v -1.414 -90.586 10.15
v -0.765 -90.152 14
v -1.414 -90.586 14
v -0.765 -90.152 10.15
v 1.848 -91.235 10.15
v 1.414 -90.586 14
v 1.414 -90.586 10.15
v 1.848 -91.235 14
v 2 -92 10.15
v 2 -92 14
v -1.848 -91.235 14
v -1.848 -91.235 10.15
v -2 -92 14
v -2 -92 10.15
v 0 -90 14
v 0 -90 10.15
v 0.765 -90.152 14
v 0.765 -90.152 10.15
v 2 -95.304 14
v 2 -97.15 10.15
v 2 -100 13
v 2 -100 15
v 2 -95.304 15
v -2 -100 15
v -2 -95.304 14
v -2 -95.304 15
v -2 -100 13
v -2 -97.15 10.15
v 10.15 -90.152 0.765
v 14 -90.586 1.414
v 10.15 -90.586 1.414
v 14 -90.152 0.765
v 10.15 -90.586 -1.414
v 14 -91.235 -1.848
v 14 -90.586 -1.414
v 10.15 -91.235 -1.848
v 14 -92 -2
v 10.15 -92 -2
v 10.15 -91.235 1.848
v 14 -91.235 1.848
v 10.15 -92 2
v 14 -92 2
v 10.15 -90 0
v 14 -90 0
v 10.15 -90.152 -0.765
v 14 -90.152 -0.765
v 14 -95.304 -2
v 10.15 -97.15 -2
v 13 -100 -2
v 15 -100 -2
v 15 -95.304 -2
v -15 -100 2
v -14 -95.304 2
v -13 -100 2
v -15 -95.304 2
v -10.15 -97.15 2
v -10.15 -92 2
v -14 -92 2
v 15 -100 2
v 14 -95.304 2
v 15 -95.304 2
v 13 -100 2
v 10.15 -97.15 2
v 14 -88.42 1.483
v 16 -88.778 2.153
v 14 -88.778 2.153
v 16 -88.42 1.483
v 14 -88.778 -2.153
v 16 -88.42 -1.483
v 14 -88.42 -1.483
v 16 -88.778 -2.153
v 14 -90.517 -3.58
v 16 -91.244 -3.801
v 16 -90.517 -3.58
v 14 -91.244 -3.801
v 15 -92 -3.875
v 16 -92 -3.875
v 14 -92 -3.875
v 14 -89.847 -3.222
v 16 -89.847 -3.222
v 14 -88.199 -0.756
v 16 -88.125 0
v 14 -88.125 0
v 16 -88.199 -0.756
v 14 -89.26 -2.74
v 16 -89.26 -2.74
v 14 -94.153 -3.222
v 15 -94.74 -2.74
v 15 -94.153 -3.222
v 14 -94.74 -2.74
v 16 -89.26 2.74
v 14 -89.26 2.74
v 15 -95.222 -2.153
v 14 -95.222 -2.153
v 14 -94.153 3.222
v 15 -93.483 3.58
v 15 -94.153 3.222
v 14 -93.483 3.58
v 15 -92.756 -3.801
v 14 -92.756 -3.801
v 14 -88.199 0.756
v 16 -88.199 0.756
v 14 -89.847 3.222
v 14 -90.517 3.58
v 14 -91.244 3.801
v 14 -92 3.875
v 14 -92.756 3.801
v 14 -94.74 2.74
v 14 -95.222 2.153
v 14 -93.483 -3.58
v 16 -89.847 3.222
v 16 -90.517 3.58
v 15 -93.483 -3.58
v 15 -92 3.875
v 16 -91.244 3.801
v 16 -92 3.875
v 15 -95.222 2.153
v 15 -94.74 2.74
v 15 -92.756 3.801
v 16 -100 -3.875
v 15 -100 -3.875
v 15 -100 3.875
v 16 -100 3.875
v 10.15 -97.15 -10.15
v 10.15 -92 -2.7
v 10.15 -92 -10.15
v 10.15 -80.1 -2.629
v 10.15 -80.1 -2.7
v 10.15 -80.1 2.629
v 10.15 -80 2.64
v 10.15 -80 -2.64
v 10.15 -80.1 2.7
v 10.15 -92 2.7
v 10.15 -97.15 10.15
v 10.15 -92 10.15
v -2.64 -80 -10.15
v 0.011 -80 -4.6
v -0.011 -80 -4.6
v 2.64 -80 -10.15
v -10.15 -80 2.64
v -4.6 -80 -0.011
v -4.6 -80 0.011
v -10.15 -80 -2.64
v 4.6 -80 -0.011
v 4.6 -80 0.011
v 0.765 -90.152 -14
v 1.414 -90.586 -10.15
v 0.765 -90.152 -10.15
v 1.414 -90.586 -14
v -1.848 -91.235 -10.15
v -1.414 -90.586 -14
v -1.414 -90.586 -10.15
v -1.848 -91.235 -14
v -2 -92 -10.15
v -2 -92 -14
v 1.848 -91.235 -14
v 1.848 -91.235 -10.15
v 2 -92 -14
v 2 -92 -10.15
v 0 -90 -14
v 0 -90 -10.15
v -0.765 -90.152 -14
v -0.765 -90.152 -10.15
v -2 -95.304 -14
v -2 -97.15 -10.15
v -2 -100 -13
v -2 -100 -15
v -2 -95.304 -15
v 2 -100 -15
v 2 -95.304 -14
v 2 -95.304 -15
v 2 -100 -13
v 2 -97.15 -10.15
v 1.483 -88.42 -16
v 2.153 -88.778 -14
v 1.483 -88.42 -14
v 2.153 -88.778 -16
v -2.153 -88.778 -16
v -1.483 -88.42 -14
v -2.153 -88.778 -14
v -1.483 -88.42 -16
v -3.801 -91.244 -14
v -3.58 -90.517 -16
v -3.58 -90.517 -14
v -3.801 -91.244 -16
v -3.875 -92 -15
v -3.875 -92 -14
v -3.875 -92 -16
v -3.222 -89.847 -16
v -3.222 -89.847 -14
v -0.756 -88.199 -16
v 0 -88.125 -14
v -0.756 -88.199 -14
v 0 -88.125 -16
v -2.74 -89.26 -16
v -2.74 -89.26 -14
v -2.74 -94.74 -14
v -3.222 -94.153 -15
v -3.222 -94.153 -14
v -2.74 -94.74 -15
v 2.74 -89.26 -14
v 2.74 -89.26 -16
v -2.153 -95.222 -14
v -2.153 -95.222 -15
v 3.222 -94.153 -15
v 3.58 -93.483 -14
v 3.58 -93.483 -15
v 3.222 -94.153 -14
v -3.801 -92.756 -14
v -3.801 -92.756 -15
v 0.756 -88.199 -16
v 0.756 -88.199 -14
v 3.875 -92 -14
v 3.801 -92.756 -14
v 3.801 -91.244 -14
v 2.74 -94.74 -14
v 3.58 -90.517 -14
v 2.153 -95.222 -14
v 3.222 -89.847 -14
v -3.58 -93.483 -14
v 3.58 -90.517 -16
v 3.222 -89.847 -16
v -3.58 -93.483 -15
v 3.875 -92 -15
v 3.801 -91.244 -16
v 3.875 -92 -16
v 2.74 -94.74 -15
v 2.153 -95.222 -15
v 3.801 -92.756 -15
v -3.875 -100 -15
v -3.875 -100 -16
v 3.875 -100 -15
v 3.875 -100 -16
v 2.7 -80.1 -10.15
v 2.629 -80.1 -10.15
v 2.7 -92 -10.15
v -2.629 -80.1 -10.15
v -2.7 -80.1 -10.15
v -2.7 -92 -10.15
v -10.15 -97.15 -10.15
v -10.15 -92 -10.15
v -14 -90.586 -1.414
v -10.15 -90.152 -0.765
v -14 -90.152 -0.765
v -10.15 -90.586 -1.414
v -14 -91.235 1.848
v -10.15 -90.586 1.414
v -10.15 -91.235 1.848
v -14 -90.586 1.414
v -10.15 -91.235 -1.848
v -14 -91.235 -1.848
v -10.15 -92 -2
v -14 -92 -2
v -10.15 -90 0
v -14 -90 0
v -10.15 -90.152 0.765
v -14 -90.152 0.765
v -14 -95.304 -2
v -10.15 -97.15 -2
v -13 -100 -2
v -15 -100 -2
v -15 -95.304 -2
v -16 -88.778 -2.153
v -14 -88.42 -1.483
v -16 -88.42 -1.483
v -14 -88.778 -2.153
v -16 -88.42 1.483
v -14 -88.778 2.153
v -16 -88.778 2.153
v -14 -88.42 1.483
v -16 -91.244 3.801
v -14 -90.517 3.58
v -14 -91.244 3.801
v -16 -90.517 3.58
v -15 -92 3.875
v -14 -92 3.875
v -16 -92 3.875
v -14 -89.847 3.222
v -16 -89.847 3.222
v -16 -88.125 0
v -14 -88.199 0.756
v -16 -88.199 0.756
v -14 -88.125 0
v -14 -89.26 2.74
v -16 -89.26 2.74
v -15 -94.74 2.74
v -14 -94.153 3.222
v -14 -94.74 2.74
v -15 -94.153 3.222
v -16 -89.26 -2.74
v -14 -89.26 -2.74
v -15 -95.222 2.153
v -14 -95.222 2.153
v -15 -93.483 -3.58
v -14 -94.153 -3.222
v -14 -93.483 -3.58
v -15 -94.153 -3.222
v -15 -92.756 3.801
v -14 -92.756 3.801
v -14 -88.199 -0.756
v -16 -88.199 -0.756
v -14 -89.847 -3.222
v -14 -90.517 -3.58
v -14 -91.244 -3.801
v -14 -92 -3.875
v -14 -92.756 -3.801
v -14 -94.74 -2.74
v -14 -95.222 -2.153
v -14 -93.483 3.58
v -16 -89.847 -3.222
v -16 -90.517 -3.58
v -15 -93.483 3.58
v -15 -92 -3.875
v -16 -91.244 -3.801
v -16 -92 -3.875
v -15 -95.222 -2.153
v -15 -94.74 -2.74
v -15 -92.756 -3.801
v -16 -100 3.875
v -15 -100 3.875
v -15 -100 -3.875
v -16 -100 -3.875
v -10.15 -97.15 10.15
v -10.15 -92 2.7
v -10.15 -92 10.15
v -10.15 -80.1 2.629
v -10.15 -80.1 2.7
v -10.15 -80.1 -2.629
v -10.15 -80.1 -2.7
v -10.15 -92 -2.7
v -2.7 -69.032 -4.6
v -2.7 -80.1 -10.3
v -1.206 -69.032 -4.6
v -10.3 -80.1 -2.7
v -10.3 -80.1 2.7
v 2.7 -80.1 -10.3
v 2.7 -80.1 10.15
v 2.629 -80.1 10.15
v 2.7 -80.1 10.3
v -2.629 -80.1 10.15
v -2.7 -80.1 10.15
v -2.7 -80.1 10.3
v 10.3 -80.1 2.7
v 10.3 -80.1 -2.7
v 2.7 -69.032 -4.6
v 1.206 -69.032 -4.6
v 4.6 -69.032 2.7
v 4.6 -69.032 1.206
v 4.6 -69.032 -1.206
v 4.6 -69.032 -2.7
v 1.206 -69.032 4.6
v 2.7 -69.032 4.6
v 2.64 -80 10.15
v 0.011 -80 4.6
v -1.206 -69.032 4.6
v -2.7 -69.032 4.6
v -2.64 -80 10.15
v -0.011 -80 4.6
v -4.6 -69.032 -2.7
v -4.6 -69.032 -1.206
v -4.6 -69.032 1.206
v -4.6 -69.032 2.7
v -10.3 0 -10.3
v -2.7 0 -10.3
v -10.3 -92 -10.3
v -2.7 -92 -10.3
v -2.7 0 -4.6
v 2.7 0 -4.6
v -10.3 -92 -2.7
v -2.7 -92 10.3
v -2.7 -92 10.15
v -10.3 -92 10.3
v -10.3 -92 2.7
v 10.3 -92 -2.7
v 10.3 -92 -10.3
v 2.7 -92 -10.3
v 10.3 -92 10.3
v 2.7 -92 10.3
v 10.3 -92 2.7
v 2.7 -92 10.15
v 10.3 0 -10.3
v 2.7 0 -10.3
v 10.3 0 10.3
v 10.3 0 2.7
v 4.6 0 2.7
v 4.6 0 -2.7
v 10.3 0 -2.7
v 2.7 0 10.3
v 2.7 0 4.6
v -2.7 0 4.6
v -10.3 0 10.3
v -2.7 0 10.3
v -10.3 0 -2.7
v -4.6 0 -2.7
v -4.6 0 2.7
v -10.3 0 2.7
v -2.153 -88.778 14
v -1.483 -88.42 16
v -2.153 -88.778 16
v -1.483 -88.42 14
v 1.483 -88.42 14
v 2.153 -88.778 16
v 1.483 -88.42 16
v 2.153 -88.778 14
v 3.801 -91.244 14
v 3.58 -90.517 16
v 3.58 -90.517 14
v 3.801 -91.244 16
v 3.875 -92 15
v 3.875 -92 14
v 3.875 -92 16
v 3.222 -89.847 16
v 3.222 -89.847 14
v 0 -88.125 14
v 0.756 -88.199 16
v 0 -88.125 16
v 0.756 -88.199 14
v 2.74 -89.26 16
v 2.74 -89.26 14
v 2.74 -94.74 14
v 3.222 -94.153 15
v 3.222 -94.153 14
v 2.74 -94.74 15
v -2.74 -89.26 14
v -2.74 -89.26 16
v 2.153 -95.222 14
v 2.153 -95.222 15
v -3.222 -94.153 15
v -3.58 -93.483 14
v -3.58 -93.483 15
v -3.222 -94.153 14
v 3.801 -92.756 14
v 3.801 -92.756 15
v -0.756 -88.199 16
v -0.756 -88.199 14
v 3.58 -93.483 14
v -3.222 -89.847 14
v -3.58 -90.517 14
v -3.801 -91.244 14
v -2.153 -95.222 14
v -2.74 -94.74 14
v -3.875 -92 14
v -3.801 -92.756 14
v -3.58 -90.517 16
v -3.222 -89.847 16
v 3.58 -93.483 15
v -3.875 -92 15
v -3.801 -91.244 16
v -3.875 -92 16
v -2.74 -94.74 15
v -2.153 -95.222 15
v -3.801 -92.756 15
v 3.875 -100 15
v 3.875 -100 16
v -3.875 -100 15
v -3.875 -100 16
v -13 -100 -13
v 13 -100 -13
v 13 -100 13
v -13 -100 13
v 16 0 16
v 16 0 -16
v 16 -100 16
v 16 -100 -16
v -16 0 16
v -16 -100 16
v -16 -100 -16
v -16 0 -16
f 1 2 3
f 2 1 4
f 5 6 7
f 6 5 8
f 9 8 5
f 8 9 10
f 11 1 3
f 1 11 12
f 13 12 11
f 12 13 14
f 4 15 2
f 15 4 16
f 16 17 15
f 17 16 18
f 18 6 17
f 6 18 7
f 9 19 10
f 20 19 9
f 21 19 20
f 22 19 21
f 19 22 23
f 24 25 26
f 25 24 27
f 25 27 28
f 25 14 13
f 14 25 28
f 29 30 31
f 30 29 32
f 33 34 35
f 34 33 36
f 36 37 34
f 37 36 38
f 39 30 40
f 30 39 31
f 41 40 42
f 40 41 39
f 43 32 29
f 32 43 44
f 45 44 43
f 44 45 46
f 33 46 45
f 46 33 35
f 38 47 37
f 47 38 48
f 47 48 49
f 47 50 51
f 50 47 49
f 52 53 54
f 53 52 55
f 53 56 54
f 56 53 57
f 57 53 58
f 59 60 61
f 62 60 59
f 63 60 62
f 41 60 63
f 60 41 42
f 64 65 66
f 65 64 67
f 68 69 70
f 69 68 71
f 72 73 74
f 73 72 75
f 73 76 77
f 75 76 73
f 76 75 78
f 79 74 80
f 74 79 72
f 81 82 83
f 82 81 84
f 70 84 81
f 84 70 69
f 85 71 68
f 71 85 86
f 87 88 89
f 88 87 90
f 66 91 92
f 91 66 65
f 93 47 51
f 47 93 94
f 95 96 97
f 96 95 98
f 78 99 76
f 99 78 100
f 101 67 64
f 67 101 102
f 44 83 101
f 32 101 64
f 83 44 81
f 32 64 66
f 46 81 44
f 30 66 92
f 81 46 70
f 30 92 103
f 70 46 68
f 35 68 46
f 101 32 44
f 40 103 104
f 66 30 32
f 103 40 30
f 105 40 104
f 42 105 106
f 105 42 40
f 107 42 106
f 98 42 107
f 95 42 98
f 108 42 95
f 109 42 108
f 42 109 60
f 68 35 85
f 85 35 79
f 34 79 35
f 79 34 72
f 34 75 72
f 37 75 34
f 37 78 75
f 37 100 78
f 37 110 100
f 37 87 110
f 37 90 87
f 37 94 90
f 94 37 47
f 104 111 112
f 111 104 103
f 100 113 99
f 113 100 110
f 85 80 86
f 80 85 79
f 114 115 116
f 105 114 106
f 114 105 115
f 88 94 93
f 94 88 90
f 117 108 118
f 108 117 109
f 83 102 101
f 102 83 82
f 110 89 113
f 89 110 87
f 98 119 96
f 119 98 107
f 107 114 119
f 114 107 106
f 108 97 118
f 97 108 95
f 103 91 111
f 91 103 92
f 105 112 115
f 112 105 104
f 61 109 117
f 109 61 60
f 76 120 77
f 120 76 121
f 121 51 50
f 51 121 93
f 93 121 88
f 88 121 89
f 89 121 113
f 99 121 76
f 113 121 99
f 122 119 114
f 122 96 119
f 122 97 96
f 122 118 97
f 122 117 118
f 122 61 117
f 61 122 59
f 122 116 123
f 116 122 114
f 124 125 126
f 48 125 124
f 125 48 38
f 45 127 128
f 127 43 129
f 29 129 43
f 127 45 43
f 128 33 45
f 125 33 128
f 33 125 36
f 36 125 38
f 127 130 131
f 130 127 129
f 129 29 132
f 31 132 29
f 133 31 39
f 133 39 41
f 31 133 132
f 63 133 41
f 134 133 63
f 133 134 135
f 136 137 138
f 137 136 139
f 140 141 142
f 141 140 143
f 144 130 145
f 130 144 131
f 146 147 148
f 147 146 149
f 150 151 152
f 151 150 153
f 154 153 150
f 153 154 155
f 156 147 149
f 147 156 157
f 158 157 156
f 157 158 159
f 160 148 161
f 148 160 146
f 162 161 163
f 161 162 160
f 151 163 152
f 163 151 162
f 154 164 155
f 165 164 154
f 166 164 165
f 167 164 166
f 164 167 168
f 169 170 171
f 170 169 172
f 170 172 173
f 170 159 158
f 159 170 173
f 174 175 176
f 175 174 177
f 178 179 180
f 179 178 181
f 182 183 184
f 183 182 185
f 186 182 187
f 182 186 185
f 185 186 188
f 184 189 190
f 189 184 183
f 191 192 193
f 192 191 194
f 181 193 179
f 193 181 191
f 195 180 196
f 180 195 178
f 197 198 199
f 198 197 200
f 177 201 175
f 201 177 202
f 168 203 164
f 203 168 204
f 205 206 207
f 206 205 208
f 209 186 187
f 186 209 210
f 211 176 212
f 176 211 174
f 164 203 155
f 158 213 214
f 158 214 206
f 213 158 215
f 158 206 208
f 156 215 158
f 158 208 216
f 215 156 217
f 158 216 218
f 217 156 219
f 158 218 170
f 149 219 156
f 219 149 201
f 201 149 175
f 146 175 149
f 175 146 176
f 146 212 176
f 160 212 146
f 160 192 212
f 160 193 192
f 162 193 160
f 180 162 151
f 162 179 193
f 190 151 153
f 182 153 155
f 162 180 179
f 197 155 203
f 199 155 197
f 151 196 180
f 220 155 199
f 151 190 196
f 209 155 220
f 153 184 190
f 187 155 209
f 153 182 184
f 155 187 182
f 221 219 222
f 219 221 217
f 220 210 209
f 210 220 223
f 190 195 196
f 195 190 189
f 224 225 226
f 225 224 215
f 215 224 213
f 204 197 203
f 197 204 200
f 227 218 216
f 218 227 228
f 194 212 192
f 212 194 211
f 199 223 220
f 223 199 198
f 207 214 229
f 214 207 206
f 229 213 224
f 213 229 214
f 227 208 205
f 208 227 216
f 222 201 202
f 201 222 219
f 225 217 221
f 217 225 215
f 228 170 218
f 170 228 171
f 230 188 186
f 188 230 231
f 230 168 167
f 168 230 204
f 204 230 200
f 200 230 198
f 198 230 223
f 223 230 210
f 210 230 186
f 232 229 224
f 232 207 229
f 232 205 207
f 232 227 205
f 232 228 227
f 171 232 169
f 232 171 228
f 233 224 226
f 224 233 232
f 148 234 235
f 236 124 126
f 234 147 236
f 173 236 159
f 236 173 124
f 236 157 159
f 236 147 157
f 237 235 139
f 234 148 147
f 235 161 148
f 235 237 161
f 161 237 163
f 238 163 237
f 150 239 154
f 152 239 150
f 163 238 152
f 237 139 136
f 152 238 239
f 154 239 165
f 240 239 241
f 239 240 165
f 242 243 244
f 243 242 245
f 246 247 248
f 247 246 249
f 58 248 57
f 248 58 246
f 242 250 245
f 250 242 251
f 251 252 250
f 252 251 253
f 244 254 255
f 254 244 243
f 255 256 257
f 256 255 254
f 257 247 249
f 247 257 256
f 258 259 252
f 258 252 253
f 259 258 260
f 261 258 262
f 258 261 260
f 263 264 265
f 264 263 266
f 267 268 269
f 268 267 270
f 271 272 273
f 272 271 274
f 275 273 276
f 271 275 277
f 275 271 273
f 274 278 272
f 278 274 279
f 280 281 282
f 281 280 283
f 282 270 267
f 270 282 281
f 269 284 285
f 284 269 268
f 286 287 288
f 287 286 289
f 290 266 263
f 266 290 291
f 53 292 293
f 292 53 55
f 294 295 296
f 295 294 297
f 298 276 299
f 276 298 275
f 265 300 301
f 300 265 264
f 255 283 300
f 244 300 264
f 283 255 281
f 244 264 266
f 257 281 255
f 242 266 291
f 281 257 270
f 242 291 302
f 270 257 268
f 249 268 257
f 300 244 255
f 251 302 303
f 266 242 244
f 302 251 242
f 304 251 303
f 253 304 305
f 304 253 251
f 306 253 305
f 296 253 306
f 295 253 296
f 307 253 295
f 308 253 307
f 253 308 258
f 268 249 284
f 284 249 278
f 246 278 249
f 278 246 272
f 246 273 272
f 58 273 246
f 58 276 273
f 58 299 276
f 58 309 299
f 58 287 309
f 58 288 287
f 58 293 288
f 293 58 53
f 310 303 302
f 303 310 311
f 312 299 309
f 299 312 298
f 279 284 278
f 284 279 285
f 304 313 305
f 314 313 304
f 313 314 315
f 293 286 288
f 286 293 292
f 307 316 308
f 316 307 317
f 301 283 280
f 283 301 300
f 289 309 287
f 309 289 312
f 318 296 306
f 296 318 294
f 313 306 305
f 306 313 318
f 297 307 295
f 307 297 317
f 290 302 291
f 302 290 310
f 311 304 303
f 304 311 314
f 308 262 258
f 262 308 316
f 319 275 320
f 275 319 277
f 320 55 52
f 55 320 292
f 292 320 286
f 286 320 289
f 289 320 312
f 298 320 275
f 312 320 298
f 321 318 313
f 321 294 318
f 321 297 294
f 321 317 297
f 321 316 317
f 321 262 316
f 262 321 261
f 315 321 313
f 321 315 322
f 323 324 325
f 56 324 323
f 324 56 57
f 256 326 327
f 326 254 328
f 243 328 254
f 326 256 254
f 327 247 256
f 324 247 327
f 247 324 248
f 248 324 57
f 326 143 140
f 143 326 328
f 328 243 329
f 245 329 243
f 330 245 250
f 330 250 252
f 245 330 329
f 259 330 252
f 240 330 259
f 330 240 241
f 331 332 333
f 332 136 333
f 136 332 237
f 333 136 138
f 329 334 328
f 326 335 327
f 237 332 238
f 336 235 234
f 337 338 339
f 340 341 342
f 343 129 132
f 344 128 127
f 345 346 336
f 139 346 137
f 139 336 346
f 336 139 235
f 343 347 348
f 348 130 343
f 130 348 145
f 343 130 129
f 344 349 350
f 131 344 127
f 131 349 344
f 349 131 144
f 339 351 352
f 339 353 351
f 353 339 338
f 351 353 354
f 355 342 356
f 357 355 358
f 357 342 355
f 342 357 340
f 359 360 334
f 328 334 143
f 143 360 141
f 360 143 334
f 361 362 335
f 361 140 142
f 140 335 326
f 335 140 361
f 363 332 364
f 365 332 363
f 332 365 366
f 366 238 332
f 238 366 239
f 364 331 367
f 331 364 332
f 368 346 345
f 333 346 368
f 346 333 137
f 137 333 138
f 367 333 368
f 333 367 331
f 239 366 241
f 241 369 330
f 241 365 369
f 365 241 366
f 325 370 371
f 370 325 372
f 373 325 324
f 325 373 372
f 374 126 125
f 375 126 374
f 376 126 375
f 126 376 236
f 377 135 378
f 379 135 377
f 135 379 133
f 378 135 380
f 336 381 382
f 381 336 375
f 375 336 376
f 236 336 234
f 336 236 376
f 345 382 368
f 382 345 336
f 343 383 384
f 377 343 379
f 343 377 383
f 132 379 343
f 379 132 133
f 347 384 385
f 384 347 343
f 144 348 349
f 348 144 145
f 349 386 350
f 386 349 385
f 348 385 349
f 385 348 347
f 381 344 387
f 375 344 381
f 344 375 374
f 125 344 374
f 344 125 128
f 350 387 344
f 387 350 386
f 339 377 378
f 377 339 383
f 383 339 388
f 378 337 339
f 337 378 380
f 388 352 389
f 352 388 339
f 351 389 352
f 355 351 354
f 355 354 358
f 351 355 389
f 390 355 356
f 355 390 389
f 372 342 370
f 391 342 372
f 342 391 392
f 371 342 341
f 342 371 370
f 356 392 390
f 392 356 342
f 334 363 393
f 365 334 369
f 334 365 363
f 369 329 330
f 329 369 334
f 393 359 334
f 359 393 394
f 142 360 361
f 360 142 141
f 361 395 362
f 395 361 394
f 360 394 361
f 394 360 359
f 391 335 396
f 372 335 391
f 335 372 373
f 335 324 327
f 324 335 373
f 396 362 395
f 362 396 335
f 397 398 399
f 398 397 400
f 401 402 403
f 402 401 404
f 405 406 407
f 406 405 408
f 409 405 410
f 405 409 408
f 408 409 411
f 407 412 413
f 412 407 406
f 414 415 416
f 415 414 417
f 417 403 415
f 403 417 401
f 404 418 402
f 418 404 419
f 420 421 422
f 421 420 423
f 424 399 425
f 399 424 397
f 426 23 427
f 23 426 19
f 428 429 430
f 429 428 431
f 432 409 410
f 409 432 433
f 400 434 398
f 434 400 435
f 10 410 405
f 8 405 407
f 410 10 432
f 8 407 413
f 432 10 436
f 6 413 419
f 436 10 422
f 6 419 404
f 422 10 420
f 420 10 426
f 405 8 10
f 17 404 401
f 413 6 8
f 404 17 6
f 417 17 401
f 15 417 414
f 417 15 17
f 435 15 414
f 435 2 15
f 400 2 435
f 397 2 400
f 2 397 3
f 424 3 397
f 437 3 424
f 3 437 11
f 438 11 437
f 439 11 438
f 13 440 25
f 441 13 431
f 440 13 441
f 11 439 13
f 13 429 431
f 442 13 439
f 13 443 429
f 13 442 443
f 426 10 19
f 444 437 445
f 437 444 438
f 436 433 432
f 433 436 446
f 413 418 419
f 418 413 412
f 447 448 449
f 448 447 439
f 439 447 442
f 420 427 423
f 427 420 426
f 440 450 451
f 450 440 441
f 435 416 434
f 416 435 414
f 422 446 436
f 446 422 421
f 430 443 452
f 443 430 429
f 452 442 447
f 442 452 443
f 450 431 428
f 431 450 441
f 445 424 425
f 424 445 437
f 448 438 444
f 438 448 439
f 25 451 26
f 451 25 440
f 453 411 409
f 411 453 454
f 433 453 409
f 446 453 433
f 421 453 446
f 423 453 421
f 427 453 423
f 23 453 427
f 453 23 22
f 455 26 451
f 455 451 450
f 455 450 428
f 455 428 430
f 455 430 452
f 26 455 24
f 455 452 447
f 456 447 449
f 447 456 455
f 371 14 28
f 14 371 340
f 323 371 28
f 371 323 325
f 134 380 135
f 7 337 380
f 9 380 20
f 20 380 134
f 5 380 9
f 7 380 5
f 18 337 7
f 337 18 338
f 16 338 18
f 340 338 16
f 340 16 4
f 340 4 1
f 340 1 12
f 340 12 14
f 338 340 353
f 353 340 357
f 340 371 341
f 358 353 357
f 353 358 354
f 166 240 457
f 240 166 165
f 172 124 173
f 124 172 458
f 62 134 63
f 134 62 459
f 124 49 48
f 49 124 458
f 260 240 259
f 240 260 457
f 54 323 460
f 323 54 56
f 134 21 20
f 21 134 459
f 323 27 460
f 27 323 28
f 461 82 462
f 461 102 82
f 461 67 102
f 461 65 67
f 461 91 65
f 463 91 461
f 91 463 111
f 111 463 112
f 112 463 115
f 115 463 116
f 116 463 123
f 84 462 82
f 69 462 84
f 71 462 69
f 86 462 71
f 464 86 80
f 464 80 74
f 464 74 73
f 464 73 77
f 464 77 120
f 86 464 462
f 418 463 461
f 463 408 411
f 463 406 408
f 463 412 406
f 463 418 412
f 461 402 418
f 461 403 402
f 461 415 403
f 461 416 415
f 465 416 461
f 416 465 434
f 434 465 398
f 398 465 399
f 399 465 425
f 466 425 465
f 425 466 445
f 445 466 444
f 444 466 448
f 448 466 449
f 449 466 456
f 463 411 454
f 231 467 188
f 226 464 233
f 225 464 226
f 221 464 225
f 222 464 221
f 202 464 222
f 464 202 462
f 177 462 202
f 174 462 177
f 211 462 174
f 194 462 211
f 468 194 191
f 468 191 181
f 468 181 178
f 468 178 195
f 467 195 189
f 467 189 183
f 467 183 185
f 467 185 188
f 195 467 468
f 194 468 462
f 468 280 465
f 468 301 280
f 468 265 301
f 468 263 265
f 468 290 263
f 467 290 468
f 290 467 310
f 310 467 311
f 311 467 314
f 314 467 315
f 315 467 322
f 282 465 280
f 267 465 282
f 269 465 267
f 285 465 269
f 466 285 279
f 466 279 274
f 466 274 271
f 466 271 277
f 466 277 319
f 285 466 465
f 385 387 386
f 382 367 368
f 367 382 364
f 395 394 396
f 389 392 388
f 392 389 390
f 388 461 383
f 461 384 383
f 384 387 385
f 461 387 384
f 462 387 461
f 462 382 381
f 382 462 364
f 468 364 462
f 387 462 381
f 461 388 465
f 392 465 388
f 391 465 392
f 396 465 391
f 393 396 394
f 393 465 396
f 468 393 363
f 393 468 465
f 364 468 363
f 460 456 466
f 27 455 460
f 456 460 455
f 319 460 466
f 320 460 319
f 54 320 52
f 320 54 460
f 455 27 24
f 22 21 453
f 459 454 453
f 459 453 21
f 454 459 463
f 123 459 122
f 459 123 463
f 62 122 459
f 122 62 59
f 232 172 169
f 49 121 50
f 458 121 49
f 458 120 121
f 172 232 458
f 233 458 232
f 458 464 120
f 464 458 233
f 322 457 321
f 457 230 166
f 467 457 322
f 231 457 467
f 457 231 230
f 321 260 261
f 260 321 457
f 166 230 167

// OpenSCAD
// Generated by SolidPython 1.1.3 on 2023-12-29 22:18:56


translate(v = [0, -100.0, 0]) {
	difference() {
		translate(v = [0, 50.0, 0]) {
			cube(center = true, size = [32.0000000000, 100.0, 32.0000000000]);
		}
		translate(v = [0, 8, 0]) {
			union() {
				translate(v = [0, 0, 14]) {
					cylinder($fn = 32, h = 4, r = 3.8750000000);
				}
				translate(v = [-3.8750000000, -12, 15]) {
					cube(size = [7.7500000000, 12, 4]);
				}
				union() {
					cylinder($fn = 16, h = 19, r = 2.0000000000);
					translate(v = [-2.0000000000, -12, 0]) {
						cube(size = [4, 12, 19]);
					}
				}
				rotate(a = -90, v = [0, 1, 0]) {
					polyhedron(convexity = 10, faces = [[0, 1, 3], [1, 4, 3], [1, 2, 4], [2, 5, 4], [2, 0, 5], [0, 3, 5], [2, 1, 0], [3, 4, 5]], points = [[0.0000000000, -10.0000000000, 0.0000000000], [10.1500000000, -10.0000000000, 10.1500000000], [10.1500000000, -10.0000000000, -10.1500000000], [0.0000000000, 12.0000000000, 0.0000000000], [10.1500000000, 12.0000000000, 10.1500000000], [10.1500000000, 12.0000000000, -10.1500000000]]);
				}
				rotate(a = 90, v = [0, 1, 0]) {
					union() {
						translate(v = [0, 0, 14]) {
							cylinder($fn = 32, h = 4, r = 3.8750000000);
						}
						translate(v = [-3.8750000000, -12, 15]) {
							cube(size = [7.7500000000, 12, 4]);
						}
						union() {
							cylinder($fn = 16, h = 19, r = 2.0000000000);
							translate(v = [-2.0000000000, -12, 0]) {
								cube(size = [4, 12, 19]);
							}
						}
						rotate(a = -90, v = [0, 1, 0]) {
							polyhedron(convexity = 10, faces = [[0, 1, 3], [1, 4, 3], [1, 2, 4], [2, 5, 4], [2, 0, 5], [0, 3, 5], [2, 1, 0], [3, 4, 5]], points = [[0.0000000000, -10.0000000000, 0.0000000000], [10.1500000000, -10.0000000000, 10.1500000000], [10.1500000000, -10.0000000000, -10.1500000000], [0.0000000000, 12.0000000000, 0.0000000000], [10.1500000000, 12.0000000000, 10.1500000000], [10.1500000000, 12.0000000000, -10.1500000000]]);
						}
					}
				}
				rotate(a = 180, v = [0, 1, 0]) {
					union() {
						translate(v = [0, 0, 14]) {
							cylinder($fn = 32, h = 4, r = 3.8750000000);
						}
						translate(v = [-3.8750000000, -12, 15]) {
							cube(size = [7.7500000000, 12, 4]);
						}
						union() {
							cylinder($fn = 16, h = 19, r = 2.0000000000);
							translate(v = [-2.0000000000, -12, 0]) {
								cube(size = [4, 12, 19]);
							}
						}
						rotate(a = -90, v = [0, 1, 0]) {
							polyhedron(convexity = 10, faces = [[0, 1, 3], [1, 4, 3], [1, 2, 4], [2, 5, 4], [2, 0, 5], [0, 3, 5], [2, 1, 0], [3, 4, 5]], points = [[0.0000000000, -10.0000000000, 0.0000000000], [10.1500000000, -10.0000000000, 10.1500000000], [10.1500000000, -10.0000000000, -10.1500000000], [0.0000000000, 12.0000000000, 0.0000000000], [10.1500000000, 12.0000000000, 10.1500000000], [10.1500000000, 12.0000000000, -10.1500000000]]);
						}
					}
				}
				rotate(a = 270, v = [0, 1, 0]) {
					union() {
						translate(v = [0, 0, 14]) {
							cylinder($fn = 32, h = 4, r = 3.8750000000);
						}
						translate(v = [-3.8750000000, -12, 15]) {
							cube(size = [7.7500000000, 12, 4]);
						}
						union() {
							cylinder($fn = 16, h = 19, r = 2.0000000000);
							translate(v = [-2.0000000000, -12, 0]) {
								cube(size = [4, 12, 19]);
							}
						}
						rotate(a = -90, v = [0, 1, 0]) {
							polyhedron(convexity = 10, faces = [[0, 1, 3], [1, 4, 3], [1, 2, 4], [2, 5, 4], [2, 0, 5], [0, 3, 5], [2, 1, 0], [3, 4, 5]], points = [[0.0000000000, -10.0000000000, 0.0000000000], [10.1500000000, -10.0000000000, 10.1500000000], [10.1500000000, -10.0000000000, -10.1500000000], [0.0000000000, 12.0000000000, 0.0000000000], [10.1500000000, 12.0000000000, 10.1500000000], [10.1500000000, 12.0000000000, -10.1500000000]]);
						}
					}
				}
				translate(v = [0, -10, 0]) {
					rotate(a = -90, v = [1, 0, 0]) {
						polyhedron(convexity = 10, faces = [[0, 1, 4], [1, 5, 4], [1, 2, 5], [2, 6, 5], [2, 3, 6], [3, 7, 6], [3, 0, 7], [0, 4, 7], [3, 2, 1, 0], [4, 5, 6, 7]], points = [[-15.0000000000, 15.0000000000, 0.0000000000], [15.0000000000, 15.0000000000, 0.0000000000], [15.0000000000, -15.0000000000, 0.0000000000], [-15.0000000000, -15.0000000000, 0.0000000000], [0.0000000000, 0.0000000000, 15.0000000000], [0.0000000000, 0.0000000000, 15.0000000000], [0.0000000000, 0.0000000000, 15.0000000000], [0.0000000000, 0.0000000000, 15.0000000000]]);
					}
				}
				translate(v = [0, 11.9000000000, 0]) {
					rotate(a = -90, v = [1, 0, 0]) {
						union() {
							polyhedron(convexity = 10, faces = [[0, 1, 4], [1, 5, 4], [1, 2, 5], [2, 6, 5], [2, 3, 6], [3, 7, 6], [3, 0, 7], [0, 4, 7], [3, 2, 1, 0], [4, 5, 6, 7]], points = [[-10.3000000000, 10.3000000000, 0.0000000000], [-10.3000000000, 2.7000000000, 0.0000000000], [-4.6000000000, 0.0000000000, 0.0000000000], [0.0000000000, 0.0000000000, 0.0000000000], [0.0000000000, 0.0000000000, 20.0000000000], [0.0000000000, 0.0000000000, 20.0000000000], [0.0000000000, 0.0000000000, 20.0000000000], [0.0000000000, 0.0000000000, 20.0000000000]]);
							mirror(v = [0, 1]) {
								polyhedron(convexity = 10, faces = [[0, 1, 4], [1, 5, 4], [1, 2, 5], [2, 6, 5], [2, 3, 6], [3, 7, 6], [3, 0, 7], [0, 4, 7], [3, 2, 1, 0], [4, 5, 6, 7]], points = [[-10.3000000000, 10.3000000000, 0.0000000000], [-10.3000000000, 2.7000000000, 0.0000000000], [-4.6000000000, 0.0000000000, 0.0000000000], [0.0000000000, 0.0000000000, 0.0000000000], [0.0000000000, 0.0000000000, 20.0000000000], [0.0000000000, 0.0000000000, 20.0000000000], [0.0000000000, 0.0000000000, 20.0000000000], [0.0000000000, 0.0000000000, 20.0000000000]]);
							}
							mirror(v = [1, 1]) {
								union() {
									polyhedron(convexity = 10, faces = [[0, 1, 4], [1, 5, 4], [1, 2, 5], [2, 6, 5], [2, 3, 6], [3, 7, 6], [3, 0, 7], [0, 4, 7], [3, 2, 1, 0], [4, 5, 6, 7]], points = [[-10.3000000000, 10.3000000000, 0.0000000000], [-10.3000000000, 2.7000000000, 0.0000000000], [-4.6000000000, 0.0000000000, 0.0000000000], [0.0000000000, 0.0000000000, 0.0000000000], [0.0000000000, 0.0000000000, 20.0000000000], [0.0000000000, 0.0000000000, 20.0000000000], [0.0000000000, 0.0000000000, 20.0000000000], [0.0000000000, 0.0000000000, 20.0000000000]]);
									mirror(v = [0, 1]) {
										polyhedron(convexity = 10, faces = [[0, 1, 4], [1, 5, 4], [1, 2, 5], [2, 6, 5], [2, 3, 6], [3, 7, 6], [3, 0, 7], [0, 4, 7], [3, 2, 1, 0], [4, 5, 6, 7]], points = [[-10.3000000000, 10.3000000000, 0.0000000000], [-10.3000000000, 2.7000000000, 0.0000000000], [-4.6000000000, 0.0000000000, 0.0000000000], [0.0000000000, 0.0000000000, 0.0000000000], [0.0000000000, 0.0000000000, 20.0000000000], [0.0000000000, 0.0000000000, 20.0000000000], [0.0000000000, 0.0000000000, 20.0000000000], [0.0000000000, 0.0000000000, 20.0000000000]]);
									}
								}
							}
							mirror(v = [1, -1]) {
								union() {
									polyhedron(convexity = 10, faces = [[0, 1, 4], [1, 5, 4], [1, 2, 5], [2, 6, 5], [2, 3, 6], [3, 7, 6], [3, 0, 7], [0, 4, 7], [3, 2, 1, 0], [4, 5, 6, 7]], points = [[-10.3000000000, 10.3000000000, 0.0000000000], [-10.3000000000, 2.7000000000, 0.0000000000], [-4.6000000000, 0.0000000000, 0.0000000000], [0.0000000000, 0.0000000000, 0.0000000000], [0.0000000000, 0.0000000000, 20.0000000000], [0.0000000000, 0.0000000000, 20.0000000000], [0.0000000000, 0.0000000000, 20.0000000000], [0.0000000000, 0.0000000000, 20.0000000000]]);
									mirror(v = [0, 1]) {
										polyhedron(convexity = 10, faces = [[0, 1, 4], [1, 5, 4], [1, 2, 5], [2, 6, 5], [2, 3, 6], [3, 7, 6], [3, 0, 7], [0, 4, 7], [3, 2, 1, 0], [4, 5, 6, 7]], points = [[-10.3000000000, 10.3000000000, 0.0000000000], [-10.3000000000, 2.7000000000, 0.0000000000], [-4.6000000000, 0.0000000000, 0.0000000000], [0.0000000000, 0.0000000000, 0.0000000000], [0.0000000000, 0.0000000000, 20.0000000000], [0.0000000000, 0.0000000000, 20.0000000000], [0.0000000000, 0.0000000000, 20.0000000000], [0.0000000000, 0.0000000000, 20.0000000000]]);
									}
									mirror(v = [1, 1]) {
										union() {
											polyhedron(convexity = 10, faces = [[0, 1, 4], [1, 5, 4], [1, 2, 5], [2, 6, 5], [2, 3, 6], [3, 7, 6], [3, 0, 7], [0, 4, 7], [3, 2, 1, 0], [4, 5, 6, 7]], points = [[-10.3000000000, 10.3000000000, 0.0000000000], [-10.3000000000, 2.7000000000, 0.0000000000], [-4.6000000000, 0.0000000000, 0.0000000000], [0.0000000000, 0.0000000000, 0.0000000000], [0.0000000000, 0.0000000000, 20.0000000000], [0.0000000000, 0.0000000000, 20.0000000000], [0.0000000000, 0.0000000000, 20.0000000000], [0.0000000000, 0.0000000000, 20.0000000000]]);
											mirror(v = [0, 1]) {
												polyhedron(convexity = 10, faces = [[0, 1, 4], [1, 5, 4], [1, 2, 5], [2, 6, 5], [2, 3, 6], [3, 7, 6], [3, 0, 7], [0, 4, 7], [3, 2, 1, 0], [4, 5, 6, 7]], points = [[-10.3000000000, 10.3000000000, 0.0000000000], [-10.3000000000, 2.7000000000, 0.0000000000], [-4.6000000000, 0.0000000000, 0.0000000000], [0.0000000000, 0.0000000000, 0.0000000000], [0.0000000000, 0.0000000000, 20.0000000000], [0.0000000000, 0.0000000000, 20.0000000000], [0.0000000000, 0.0000000000, 20.0000000000], [0.0000000000, 0.0000000000, 20.0000000000]]);
											}
										}
									}
								}
							}
						}
					}
				}
				rotate(a = -90, v = [1, 0, 0]) {
					union() {
						polyhedron(convexity = 10, faces = [[0, 1, 5], [1, 6, 5], [1, 2, 6], [2, 7, 6], [2, 3, 7], [3, 8, 7], [3, 4, 8], [4, 9, 8], [4, 0, 9], [0, 5, 9], [4, 3, 2, 1, 0], [5, 6, 7, 8, 9]], points = [[-10.3, 10.3, 0.0], [-10.3, 2.7, 0.0], [-4.6000000000000005, 2.7, 0.0], [-4.6000000000000005, 0.0, 0.0], [0.0, 0.0, 0.0], [-10.3, 10.3, 100.0], [-10.3, 2.7, 100.0], [-4.6000000000000005, 2.7, 100.0], [-4.6000000000000005, 0.0, 100.0], [0.0, 0.0, 100.0]]);
						mirror(v = [0, 1]) {
							polyhedron(convexity = 10, faces = [[0, 1, 5], [1, 6, 5], [1, 2, 6], [2, 7, 6], [2, 3, 7], [3, 8, 7], [3, 4, 8], [4, 9, 8], [4, 0, 9], [0, 5, 9], [4, 3, 2, 1, 0], [5, 6, 7, 8, 9]], points = [[-10.3, 10.3, 0.0], [-10.3, 2.7, 0.0], [-4.6000000000000005, 2.7, 0.0], [-4.6000000000000005, 0.0, 0.0], [0.0, 0.0, 0.0], [-10.3, 10.3, 100.0], [-10.3, 2.7, 100.0], [-4.6000000000000005, 2.7, 100.0], [-4.6000000000000005, 0.0, 100.0], [0.0, 0.0, 100.0]]);
						}
						mirror(v = [1, 1]) {
							union() {
								polyhedron(convexity = 10, faces = [[0, 1, 5], [1, 6, 5], [1, 2, 6], [2, 7, 6], [2, 3, 7], [3, 8, 7], [3, 4, 8], [4, 9, 8], [4, 0, 9], [0, 5, 9], [4, 3, 2, 1, 0], [5, 6, 7, 8, 9]], points = [[-10.3, 10.3, 0.0], [-10.3, 2.7, 0.0], [-4.6000000000000005, 2.7, 0.0], [-4.6000000000000005, 0.0, 0.0], [0.0, 0.0, 0.0], [-10.3, 10.3, 100.0], [-10.3, 2.7, 100.0], [-4.6000000000000005, 2.7, 100.0], [-4.6000000000000005, 0.0, 100.0], [0.0, 0.0, 100.0]]);
								mirror(v = [0, 1]) {
									polyhedron(convexity = 10, faces = [[0, 1, 5], [1, 6, 5], [1, 2, 6], [2, 7, 6], [2, 3, 7], [3, 8, 7], [3, 4, 8], [4, 9, 8], [4, 0, 9], [0, 5, 9], [4, 3, 2, 1, 0], [5, 6, 7, 8, 9]], points = [[-10.3, 10.3, 0.0], [-10.3, 2.7, 0.0], [-4.6000000000000005, 2.7, 0.0], [-4.6000000000000005, 0.0, 0.0], [0.0, 0.0, 0.0], [-10.3, 10.3, 100.0], [-10.3, 2.7, 100.0], [-4.6000000000000005, 2.7, 100.0], [-4.6000000000000005, 0.0, 100.0], [0.0, 0.0, 100.0]]);
								}
							}
						}
						mirror(v = [1, -1]) {
							union() {
								polyhedron(convexity = 10, faces = [[0, 1, 5], [1, 6, 5], [1, 2, 6], [2, 7, 6], [2, 3, 7], [3, 8, 7], [3, 4, 8], [4, 9, 8], [4, 0, 9], [0, 5, 9], [4, 3, 2, 1, 0], [5, 6, 7, 8, 9]], points = [[-10.3, 10.3, 0.0], [-10.3, 2.7, 0.0], [-4.6000000000000005, 2.7, 0.0], [-4.6000000000000005, 0.0, 0.0], [0.0, 0.0, 0.0], [-10.3, 10.3, 100.0], [-10.3, 2.7, 100.0], [-4.6000000000000005, 2.7, 100.0], [-4.6000000000000005, 0.0, 100.0], [0.0, 0.0, 100.0]]);
								mirror(v = [0, 1]) {
									polyhedron(convexity = 10, faces = [[0, 1, 5], [1, 6, 5], [1, 2, 6], [2, 7, 6], [2, 3, 7], [3, 8, 7], [3, 4, 8], [4, 9, 8], [4, 0, 9], [0, 5, 9], [4, 3, 2, 1, 0], [5, 6, 7, 8, 9]], points = [[-10.3, 10.3, 0.0], [-10.3, 2.7, 0.0], [-4.6000000000000005, 2.7, 0.0], [-4.6000000000000005, 0.0, 0.0], [0.0, 0.0, 0.0], [-10.3, 10.3, 100.0], [-10.3, 2.7, 100.0], [-4.6000000000000005, 2.7, 100.0], [-4.6000000000000005, 0.0, 100.0], [0.0, 0.0, 100.0]]);
								}
								mirror(v = [1, 1]) {
									union() {
										polyhedron(convexity = 10, faces = [[0, 1, 5], [1, 6, 5], [1, 2, 6], [2, 7, 6], [2, 3, 7], [3, 8, 7], [3, 4, 8], [4, 9, 8], [4, 0, 9], [0, 5, 9], [4, 3, 2, 1, 0], [5, 6, 7, 8, 9]], points = [[-10.3, 10.3, 0.0], [-10.3, 2.7, 0.0], [-4.6000000000000005, 2.7, 0.0], [-4.6000000000000005, 0.0, 0.0], [0.0, 0.0, 0.0], [-10.3, 10.3, 100.0], [-10.3, 2.7, 100.0], [-4.6000000000000005, 2.7, 100.0], [-4.6000000000000005, 0.0, 100.0], [0.0, 0.0, 100.0]]);
										mirror(v = [0, 1]) {
											polyhedron(convexity = 10, faces = [[0, 1, 5], [1, 6, 5], [1, 2, 6], [2, 7, 6], [2, 3, 7], [3, 8, 7], [3, 4, 8], [4, 9, 8], [4, 0, 9], [0, 5, 9], [4, 3, 2, 1, 0], [5, 6, 7, 8, 9]], points = [[-10.3, 10.3, 0.0], [-10.3, 2.7, 0.0], [-4.6000000000000005, 2.7, 0.0], [-4.6000000000000005, 0.0, 0.0], [0.0, 0.0, 0.0], [-10.3, 10.3, 100.0], [-10.3, 2.7, 100.0], [-4.6000000000000005, 2.7, 100.0], [-4.6000000000000005, 0.0, 100.0], [0.0, 0.0, 100.0]]);
										}
									}
								}
							}
						}
					}
				}
			}
		}
	}
}
/***********************************************
*********      SolidPython code:      **********
************************************************
 
#! /usr/bin/env python3
from solid.objects import *
from solid.solidpython import *
import sys
from math import cos, radians, sin, pi, tau
from pathlib import Path

from euclid3 import Point2, Point3, Vector3

from solid import *
from solid.utils import *

from typing import Set, Sequence, List, Callable, Optional, Union, Iterable, Tuple

import numpy as np

# ============
# = GEOMETRY =
# ============

shell_thickness = 6
e_thickness = 20
tolerance = .3
gap_size = 3 - tolerance
inner_corner = e_thickness/2 + tolerance;
outer_corner = inner_corner + shell_thickness
nub_length = 6 - tolerance

start_pt = np.array([0,0,0])
end_pt = np.array([0,0,100])
tube_length = np.linalg.norm(start_pt - end_pt)

def e_profile() -> List[Point3]:
	profile_pts = [[inner_corner,inner_corner,0],[inner_corner,gap_size,0],[inner_corner - nub_length, gap_size,0],
					[inner_corner - nub_length,0,0],[0,0,0]]

	return profile_pts

def extrude_and_mirror_profile(e_profile,length,scale) -> OpenSCADObject:
	path = [[0,0,0],[0,0,length]]
	shape = e_profile
	extruded = extrude_along_path( shape_pts=shape, path_pts=path, scales = [1,scale])
	extruded += mirror(v=(0,1))(extruded)
	extruded += mirror(v=(1,1))(extruded)
	extruded += mirror(v=(1,-1))(extruded)
	return extruded

def make_three_e(extrusion_profile) -> OpenSCADObject:
	three_extrusions = translate([0,0,10+shell_thickness])(extrusion_profile)
	three_extrusions += translate([10+shell_thickness,0,0])(rotate(a=90, v=FORWARD_VEC)(extrusion_profile))
	three_extrusions += translate(([0,50,0]))(rotate(a=90, v=RIGHT_VEC)(extrusion_profile))
	return three_extrusions

def make_shell() -> OpenSCADObject:
	total = (e_thickness/2 + shell_thickness)*2
	# base_cube = cube([total, total, total], center=True)
	# cube_shell = translate([0,total,0])(base_cube) + base_cube
	cube_shell = translate([0,tube_length/2,0])(cube([total, tube_length, total], center=True))
	return cube_shell

def bisect_floor(input) -> OpenSCADObject:
	size = 300
	floor = translate([0,0,-150])(cube([300,300,300],center = True))
	return input - floor

def hammer_nut_hole() -> OpenSCADObject:
	inset_length = 12
	extrusion_size = 20 + tolerance
	hes = extrusion_size/2
	hammer_nut_pts = [[0,0,0],[hes,hes,0],[hes,-hes,0]]
	hammer_nut_path = [[0,-10,0],[0,inset_length,0]]
	hammer_nut_hole = extrude_along_path(shape_pts=hammer_nut_pts, path_pts=hammer_nut_path)
	hammer_nut_hole = rotate(-90, v=FORWARD_VEC)(hammer_nut_hole)
	shape = hammer_nut_hole
	return shape

def head_slot() -> OpenSCADObject:
	head_height = 14
	head_diameter = 7.75
	cyl_sides = 32
	inset_length = 12
	head_hole = translate([0,0,head_height])(cylinder(r = head_diameter/2, h = 4, segments = cyl_sides))
	head_slot = translate([head_diameter/-2,-inset_length,head_height+1])(cube([head_diameter,inset_length,4]))
	shape = head_hole
	shape += head_slot
	return shape

def screw_slot() -> OpenSCADObject:
	screw_diameter = 4
	screw_height = 19
	cyl_sides = 16
	inset_length = 12
	screw_hole = cylinder(r = screw_diameter/2, h = screw_height, segments = cyl_sides) 
	screw_slot = translate([screw_diameter/-2,-inset_length,0])(cube([screw_diameter,inset_length,screw_height]))
	shape = screw_hole
	shape +=  screw_slot
	return shape

def slot() -> OpenSCADObject:
	return head_slot() + screw_slot() + hammer_nut_hole()

def screw_slots() -> OpenSCADObject:
	screw_slots = slot()
	screw_slots+= rotate(90,v=FORWARD_VEC)(slot())
	screw_slots+= rotate(180,v=FORWARD_VEC)(slot())
	screw_slots+= rotate(270,v=FORWARD_VEC)(slot())
	return screw_slots

def pyramid(size = 15) -> OpenSCADObject:
	base_pts = [[size,size,0],[-size,size,0],[-size,-size,0],[size,-size,0]]
	path_pts = [[0,0,0],[0,0,size]]
	pyramid =  extrude_along_path(shape_pts = base_pts, path_pts = path_pts, scales = [1,0])
	pyramid = rotate(-90,v=RIGHT_VEC)(pyramid())
	pyramid = translate([0,-10,0])(pyramid)
	return pyramid

def star_profile() -> List[Point3]:
	corner = inner_corner
	profile_pts = [[corner,corner,0],[corner,gap_size,0],
					[corner - nub_length,0,0],[0,0,0]]

	return profile_pts

def star_spike() -> OpenSCADObject:
	spike = extrude_and_mirror_profile(star_profile(),20,0)
	spike = rotate(-90,v=RIGHT_VEC)(spike())
	spike = translate([0,11.9,0])(spike)
	return spike

# ===============
# = ENTRY POINT =
# ===============

if __name__ == "__main__":
	out_dir = sys.argv[1] if len(sys.argv) > 1 else Path(__file__).parent

	extrusion_profile = extrude_and_mirror_profile(e_profile(),tube_length,1)
	shell = make_shell()
	extrusion_profile = rotate(-90, v=RIGHT_VEC)(extrusion_profile)
	cutouts = screw_slots()  + pyramid(15) + star_spike()
	other_end_cutouts = translate([0,tube_length-18,0])(rotate(180,v=(1,0,0))(cutouts))
	a = cutouts 
#	a += other_end_cutouts 
	a += extrusion_profile
	a = translate([0,8,0])(a)
	a = shell - a
	a = translate([0,-tube_length,0])(a)
#	a = translate([0,-30,0])(a)
#	a = rotate(a = -45, v=(1,0,0))(a) 
#	a = rotate(a = 35.26, v=(1,0,0))(a)
#	a = bisect_floor(a)
	file_out = scad_render_to_file(a,  out_dir=out_dir, include_orig_code=True)
	print(f"{__file__}: SCAD file written to: \n{file_out}")
 
 
************************************************/
